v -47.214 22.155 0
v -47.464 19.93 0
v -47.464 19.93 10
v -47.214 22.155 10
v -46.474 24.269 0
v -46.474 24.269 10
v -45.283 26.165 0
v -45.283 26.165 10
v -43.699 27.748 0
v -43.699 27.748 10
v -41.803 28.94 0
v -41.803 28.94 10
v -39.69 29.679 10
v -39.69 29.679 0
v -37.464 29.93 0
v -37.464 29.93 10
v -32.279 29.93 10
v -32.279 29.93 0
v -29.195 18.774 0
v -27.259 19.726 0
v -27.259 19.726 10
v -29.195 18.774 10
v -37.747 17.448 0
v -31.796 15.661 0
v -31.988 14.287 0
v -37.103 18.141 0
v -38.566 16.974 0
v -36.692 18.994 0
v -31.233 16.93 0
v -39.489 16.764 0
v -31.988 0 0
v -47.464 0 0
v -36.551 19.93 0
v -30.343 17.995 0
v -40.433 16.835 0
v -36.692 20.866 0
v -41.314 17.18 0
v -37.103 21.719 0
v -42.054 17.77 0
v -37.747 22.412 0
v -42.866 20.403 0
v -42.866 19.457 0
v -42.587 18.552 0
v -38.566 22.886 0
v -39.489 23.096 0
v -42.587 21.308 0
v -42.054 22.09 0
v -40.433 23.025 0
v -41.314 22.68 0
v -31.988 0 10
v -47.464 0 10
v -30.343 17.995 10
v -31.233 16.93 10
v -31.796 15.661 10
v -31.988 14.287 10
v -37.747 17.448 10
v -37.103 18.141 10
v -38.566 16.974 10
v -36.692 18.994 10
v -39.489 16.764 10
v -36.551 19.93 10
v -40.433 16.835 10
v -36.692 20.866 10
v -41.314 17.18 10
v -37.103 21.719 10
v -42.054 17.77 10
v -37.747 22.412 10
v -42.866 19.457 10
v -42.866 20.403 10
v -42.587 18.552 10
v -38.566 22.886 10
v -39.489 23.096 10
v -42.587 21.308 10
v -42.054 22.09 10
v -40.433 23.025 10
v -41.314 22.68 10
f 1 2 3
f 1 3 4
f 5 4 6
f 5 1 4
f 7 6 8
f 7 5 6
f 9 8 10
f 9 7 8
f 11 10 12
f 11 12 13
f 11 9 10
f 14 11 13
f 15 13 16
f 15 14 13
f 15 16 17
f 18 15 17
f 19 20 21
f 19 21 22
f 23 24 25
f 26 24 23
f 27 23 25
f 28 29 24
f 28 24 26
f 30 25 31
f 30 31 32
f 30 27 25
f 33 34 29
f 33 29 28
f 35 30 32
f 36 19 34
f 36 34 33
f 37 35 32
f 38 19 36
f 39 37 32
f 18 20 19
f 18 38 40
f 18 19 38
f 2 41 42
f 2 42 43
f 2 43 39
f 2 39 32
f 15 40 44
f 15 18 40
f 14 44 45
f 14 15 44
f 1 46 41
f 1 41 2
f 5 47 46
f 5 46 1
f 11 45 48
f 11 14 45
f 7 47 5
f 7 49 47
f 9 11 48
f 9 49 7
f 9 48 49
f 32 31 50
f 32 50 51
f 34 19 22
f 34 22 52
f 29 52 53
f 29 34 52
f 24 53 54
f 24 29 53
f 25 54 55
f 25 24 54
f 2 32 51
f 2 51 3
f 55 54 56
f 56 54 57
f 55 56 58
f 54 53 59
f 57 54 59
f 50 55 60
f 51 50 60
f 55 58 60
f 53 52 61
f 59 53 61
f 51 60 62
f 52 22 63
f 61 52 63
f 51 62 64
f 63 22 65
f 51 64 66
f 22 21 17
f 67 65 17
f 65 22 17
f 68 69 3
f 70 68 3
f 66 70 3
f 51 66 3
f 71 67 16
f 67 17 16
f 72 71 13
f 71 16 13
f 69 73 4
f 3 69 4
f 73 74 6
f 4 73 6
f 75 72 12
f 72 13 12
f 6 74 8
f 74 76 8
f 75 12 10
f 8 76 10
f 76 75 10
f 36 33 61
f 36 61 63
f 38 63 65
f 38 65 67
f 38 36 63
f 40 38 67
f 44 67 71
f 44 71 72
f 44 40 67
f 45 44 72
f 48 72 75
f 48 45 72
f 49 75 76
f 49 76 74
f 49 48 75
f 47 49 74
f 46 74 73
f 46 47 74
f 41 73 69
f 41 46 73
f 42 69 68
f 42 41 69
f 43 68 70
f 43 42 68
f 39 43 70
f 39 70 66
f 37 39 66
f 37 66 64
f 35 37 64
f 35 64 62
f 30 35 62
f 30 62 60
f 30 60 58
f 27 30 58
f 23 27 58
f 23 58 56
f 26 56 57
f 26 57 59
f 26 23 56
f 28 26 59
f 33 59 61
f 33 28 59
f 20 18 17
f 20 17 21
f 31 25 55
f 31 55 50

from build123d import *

# Parameters (mm, degrees)
SKETCH1_R           = 3.175
BOSS_EXTRUDE1_DEPTH = 10


with BuildPart() as part:
    # Sketch1 → Boss-Extrude1 (new body)
    with BuildSketch(Plane.XY):
        with BuildLine():
            Line((-47.46444948, 0), (-47.46444948, 19.93))
            ThreePointArc((-47.46444948, 19.93), (-44.535517292, 27.001067812), (-37.46444948, 29.93))
            Line((-37.46444948, 29.93), (-32.278753178, 29.93))
            Line((-32.278753178, 29.93), (-29.769076862, 24.828075765))
            Line((-29.769076862, 24.828075765), (-27.259400546, 19.72615153))
            Line((-27.259400546, 19.72615153), (-29.195289257, 18.773872777))
            ThreePointArc((-29.195289257, 18.773872777), (-31.233008862, 16.929762135), (-31.988313386, 14.287308668))
            Line((-31.988313386, 14.287308668), (-31.988313386, 0))
            Line((-31.988313386, 0), (-47.46444948, 0))
        make_face()
        with Locations((-39.726381433, 19.93)):
            Circle(SKETCH1_R, mode=Mode.SUBTRACT)
    extrude(amount=BOSS_EXTRUDE1_DEPTH)


solid = part.part
